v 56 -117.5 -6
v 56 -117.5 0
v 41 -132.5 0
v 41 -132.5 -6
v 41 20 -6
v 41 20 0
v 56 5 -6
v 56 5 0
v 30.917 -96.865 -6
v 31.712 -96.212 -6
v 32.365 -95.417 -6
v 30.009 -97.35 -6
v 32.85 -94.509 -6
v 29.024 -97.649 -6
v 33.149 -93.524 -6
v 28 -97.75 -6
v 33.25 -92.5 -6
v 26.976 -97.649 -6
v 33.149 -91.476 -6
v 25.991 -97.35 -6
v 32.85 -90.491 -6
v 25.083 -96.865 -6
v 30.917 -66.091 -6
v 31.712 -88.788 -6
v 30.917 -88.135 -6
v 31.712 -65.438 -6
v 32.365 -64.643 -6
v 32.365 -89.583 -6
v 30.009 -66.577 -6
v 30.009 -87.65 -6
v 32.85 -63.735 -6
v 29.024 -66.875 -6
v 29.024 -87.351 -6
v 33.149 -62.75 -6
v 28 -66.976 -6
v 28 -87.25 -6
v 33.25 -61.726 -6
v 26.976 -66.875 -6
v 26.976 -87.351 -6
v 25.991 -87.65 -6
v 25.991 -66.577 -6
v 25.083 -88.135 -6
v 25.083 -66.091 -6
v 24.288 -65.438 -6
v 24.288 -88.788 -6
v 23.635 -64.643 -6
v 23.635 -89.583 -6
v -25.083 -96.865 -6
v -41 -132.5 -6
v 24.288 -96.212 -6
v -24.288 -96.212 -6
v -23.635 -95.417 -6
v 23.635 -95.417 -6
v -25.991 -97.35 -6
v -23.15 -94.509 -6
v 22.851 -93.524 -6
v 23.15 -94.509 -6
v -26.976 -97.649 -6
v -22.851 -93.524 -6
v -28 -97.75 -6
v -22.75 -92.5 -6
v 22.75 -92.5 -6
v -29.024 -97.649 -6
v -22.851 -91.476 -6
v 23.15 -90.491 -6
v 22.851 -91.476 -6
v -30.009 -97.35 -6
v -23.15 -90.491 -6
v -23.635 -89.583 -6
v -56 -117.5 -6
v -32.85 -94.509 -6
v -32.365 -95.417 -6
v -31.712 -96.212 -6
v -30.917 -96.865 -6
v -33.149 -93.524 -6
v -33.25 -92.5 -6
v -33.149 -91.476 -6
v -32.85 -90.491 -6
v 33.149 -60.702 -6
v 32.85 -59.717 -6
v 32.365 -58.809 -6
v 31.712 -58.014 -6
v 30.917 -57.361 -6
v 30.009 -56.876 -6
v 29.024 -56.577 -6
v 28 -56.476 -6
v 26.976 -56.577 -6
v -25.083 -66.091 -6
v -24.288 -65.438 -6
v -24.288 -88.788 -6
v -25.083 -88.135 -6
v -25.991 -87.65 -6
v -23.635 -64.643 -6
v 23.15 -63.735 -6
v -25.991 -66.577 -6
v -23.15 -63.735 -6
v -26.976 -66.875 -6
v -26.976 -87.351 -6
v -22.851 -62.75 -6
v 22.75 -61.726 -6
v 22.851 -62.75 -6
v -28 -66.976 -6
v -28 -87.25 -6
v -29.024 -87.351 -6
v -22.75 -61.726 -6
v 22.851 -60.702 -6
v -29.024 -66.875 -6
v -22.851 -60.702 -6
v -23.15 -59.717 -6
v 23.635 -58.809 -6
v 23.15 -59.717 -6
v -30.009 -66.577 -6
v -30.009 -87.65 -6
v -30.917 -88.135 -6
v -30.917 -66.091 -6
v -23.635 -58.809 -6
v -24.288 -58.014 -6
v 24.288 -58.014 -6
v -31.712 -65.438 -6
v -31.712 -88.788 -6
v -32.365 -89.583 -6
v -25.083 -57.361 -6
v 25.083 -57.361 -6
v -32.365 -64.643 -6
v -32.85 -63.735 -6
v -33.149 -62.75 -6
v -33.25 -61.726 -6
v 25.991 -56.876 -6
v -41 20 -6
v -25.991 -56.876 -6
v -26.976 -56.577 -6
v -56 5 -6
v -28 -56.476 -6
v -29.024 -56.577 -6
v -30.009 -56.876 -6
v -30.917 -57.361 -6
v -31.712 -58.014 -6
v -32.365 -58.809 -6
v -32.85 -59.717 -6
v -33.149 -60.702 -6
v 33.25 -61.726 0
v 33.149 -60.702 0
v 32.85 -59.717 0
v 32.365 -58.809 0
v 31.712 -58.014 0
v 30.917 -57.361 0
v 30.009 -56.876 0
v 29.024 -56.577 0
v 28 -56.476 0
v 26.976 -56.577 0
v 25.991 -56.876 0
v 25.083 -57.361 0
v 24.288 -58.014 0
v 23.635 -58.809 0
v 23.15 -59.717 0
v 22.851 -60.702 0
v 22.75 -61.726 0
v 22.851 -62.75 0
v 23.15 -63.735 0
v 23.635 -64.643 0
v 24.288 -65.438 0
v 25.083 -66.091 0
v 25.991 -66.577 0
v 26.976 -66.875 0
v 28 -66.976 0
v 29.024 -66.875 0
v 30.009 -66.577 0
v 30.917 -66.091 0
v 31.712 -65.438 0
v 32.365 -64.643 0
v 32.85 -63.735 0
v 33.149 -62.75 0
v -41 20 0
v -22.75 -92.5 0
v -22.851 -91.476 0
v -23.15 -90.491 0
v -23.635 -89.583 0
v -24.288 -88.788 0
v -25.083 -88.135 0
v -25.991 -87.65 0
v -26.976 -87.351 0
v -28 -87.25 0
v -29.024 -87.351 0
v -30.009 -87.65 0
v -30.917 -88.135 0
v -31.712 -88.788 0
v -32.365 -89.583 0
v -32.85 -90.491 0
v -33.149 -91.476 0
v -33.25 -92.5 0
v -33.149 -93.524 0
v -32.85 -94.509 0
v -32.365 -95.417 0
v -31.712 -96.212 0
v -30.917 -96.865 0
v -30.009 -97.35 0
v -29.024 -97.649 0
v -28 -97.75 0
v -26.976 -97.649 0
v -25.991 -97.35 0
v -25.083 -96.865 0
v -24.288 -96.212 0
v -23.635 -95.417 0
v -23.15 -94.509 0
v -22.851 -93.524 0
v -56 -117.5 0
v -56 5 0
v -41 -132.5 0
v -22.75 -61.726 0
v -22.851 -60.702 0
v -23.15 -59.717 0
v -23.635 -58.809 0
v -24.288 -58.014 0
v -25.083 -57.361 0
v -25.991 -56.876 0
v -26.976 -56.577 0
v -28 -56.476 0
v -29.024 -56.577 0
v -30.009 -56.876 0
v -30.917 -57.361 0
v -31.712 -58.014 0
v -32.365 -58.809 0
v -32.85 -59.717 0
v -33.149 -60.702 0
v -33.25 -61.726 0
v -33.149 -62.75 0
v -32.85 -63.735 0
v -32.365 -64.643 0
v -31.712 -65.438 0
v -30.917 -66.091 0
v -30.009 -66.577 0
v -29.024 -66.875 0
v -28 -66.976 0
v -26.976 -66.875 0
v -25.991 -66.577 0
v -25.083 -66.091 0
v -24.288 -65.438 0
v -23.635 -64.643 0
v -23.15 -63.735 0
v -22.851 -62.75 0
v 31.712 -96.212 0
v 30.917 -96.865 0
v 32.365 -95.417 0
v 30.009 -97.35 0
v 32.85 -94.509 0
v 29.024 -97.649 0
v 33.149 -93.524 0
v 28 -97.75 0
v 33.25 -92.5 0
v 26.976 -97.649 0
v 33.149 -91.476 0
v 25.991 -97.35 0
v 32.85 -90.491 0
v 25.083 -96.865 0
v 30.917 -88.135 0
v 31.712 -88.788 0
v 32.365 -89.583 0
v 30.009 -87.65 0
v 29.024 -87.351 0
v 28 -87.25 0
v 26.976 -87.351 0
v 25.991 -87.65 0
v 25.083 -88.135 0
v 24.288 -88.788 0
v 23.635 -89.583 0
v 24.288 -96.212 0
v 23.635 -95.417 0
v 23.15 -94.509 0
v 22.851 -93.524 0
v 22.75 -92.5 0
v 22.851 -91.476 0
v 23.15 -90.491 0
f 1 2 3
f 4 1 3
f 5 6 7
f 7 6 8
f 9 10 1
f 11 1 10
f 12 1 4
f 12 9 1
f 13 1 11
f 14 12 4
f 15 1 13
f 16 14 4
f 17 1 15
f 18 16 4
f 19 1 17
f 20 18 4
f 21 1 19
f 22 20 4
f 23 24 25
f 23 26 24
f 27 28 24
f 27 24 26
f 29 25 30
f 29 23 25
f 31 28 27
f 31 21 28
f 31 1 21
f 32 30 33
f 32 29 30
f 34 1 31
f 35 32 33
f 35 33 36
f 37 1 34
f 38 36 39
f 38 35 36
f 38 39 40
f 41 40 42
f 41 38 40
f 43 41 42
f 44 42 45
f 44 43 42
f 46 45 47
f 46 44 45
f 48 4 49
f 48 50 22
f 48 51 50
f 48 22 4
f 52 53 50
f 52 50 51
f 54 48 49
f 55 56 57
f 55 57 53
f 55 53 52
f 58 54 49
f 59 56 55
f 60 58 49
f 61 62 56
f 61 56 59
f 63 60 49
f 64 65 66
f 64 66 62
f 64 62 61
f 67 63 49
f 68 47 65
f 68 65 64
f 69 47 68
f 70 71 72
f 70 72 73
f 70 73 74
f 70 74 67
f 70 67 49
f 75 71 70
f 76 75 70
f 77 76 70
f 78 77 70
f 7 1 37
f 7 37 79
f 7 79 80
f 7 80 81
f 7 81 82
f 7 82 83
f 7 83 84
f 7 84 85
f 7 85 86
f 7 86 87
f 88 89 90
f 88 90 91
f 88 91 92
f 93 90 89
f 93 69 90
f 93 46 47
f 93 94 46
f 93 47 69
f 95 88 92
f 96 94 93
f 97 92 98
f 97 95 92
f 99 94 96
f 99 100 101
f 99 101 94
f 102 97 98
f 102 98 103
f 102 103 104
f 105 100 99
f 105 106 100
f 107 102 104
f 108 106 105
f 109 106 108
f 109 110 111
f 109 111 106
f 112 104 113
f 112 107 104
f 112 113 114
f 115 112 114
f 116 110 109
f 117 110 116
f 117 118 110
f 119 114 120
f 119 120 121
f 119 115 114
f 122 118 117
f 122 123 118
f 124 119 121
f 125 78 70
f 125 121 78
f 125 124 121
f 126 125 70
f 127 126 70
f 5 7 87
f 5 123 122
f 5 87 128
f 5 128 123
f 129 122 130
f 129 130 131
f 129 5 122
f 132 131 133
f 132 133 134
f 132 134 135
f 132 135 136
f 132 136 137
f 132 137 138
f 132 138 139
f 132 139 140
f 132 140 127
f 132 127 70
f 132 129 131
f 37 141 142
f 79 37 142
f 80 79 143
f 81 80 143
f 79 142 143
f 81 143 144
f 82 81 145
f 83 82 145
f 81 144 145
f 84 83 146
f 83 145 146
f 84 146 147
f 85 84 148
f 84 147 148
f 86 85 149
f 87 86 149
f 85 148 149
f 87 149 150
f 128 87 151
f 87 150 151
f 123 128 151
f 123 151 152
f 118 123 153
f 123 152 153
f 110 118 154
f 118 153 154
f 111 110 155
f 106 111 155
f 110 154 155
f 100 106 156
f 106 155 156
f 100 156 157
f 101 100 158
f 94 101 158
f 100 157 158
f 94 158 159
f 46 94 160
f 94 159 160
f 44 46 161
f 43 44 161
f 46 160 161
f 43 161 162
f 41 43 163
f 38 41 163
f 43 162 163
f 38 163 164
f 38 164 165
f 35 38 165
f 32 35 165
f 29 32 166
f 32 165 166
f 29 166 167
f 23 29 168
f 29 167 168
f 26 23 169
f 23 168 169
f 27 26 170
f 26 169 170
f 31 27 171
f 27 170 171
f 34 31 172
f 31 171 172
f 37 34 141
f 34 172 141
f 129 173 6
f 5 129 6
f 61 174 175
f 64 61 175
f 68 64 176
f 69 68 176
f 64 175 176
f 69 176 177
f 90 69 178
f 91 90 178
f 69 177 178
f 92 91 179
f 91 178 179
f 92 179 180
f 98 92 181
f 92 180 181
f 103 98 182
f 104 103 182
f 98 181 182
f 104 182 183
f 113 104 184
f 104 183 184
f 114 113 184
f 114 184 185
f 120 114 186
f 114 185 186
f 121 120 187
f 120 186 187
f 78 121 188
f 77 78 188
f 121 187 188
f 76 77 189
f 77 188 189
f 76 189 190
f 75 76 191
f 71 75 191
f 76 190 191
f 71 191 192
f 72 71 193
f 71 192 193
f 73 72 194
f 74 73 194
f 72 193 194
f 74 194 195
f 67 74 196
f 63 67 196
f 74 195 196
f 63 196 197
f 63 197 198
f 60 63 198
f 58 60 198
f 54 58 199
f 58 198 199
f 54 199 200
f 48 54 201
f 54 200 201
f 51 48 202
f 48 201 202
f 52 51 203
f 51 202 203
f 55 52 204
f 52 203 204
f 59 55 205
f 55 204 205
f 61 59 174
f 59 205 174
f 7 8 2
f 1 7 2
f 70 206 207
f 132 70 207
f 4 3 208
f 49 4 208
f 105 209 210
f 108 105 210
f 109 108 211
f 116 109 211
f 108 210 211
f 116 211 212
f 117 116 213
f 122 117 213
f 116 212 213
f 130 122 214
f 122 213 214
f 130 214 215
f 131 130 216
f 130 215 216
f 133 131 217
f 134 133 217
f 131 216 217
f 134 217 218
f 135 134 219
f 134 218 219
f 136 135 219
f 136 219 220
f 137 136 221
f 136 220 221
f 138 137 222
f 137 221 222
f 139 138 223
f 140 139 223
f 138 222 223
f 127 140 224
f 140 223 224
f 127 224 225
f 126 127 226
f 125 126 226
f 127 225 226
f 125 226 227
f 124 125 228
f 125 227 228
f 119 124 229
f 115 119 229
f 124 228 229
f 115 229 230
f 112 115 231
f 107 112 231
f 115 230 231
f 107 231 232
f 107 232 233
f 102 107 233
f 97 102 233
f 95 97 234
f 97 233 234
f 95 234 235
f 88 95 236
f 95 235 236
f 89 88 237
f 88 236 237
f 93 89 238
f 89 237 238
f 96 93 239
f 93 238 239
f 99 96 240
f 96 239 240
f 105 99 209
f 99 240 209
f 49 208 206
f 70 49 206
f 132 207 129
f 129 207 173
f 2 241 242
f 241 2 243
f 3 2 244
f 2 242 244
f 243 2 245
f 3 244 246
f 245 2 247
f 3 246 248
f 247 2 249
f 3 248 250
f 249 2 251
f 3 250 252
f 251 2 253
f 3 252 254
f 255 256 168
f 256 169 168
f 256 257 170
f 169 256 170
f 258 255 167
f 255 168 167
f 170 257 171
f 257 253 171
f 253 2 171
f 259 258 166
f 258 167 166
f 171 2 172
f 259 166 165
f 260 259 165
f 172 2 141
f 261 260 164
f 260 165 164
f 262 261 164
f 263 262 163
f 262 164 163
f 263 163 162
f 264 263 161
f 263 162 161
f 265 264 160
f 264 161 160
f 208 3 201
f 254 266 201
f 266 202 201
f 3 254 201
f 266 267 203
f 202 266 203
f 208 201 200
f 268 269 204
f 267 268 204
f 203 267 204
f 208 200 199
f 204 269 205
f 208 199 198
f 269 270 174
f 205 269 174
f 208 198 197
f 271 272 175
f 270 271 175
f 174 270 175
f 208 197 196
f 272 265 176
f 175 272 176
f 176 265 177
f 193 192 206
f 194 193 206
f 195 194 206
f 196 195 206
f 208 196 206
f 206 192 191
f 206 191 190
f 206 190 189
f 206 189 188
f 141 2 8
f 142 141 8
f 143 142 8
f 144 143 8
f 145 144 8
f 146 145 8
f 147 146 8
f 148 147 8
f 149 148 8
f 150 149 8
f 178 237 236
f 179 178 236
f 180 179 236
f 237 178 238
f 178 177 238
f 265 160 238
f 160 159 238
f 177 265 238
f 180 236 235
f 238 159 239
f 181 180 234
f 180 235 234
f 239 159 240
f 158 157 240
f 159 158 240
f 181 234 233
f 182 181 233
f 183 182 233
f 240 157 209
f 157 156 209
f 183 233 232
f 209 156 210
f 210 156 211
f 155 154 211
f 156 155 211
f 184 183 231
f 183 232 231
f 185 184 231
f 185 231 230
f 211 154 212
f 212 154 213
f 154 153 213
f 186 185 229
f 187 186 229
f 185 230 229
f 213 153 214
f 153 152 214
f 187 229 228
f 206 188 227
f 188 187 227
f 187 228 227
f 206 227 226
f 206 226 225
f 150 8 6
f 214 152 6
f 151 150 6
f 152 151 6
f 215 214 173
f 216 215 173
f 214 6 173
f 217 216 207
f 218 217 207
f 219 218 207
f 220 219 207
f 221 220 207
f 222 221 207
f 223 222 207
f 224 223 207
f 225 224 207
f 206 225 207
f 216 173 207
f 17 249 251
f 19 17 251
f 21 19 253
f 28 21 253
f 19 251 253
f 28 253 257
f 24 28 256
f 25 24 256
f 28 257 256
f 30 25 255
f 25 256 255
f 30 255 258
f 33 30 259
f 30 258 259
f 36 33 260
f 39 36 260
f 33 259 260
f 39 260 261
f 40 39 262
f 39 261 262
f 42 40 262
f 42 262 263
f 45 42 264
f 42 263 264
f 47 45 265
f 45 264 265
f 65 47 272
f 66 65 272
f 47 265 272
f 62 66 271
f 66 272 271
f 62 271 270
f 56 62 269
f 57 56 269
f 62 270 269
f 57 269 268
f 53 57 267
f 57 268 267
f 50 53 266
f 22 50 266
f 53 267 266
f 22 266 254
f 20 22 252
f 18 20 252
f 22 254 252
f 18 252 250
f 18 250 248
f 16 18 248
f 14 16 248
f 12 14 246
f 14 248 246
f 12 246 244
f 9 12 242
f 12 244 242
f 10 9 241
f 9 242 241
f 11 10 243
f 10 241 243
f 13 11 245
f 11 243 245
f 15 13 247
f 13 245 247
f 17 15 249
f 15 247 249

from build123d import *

# Parameters (mm, degrees)
SKETCH_1_R             = 5.25
SM_BASE_FLANGE_1_DEPTH = 6


# Sheet-metal steps are written as plain solids
with BuildPart() as part:
    # Sketch 1 → Базовая кромка1 (new body)
    with BuildSketch(Plane.XY):
        Polygon((-41, -132.5), (-56, -117.5), (-56, 5), (-41, 20), (41, 20), (56, 5), (56, -117.5), (41, -132.5), align=None)
        with Locations((28, -61.72618932)):
            Circle(SKETCH_1_R, mode=Mode.SUBTRACT)
        with Locations((28, -92.5)):
            Circle(SKETCH_1_R, mode=Mode.SUBTRACT)
        with Locations((-28, -92.5)):
            Circle(SKETCH_1_R, mode=Mode.SUBTRACT)
        with Locations((-28, -61.72618932)):
            Circle(SKETCH_1_R, mode=Mode.SUBTRACT)
    extrude(amount=-SM_BASE_FLANGE_1_DEPTH)


solid = part.part
